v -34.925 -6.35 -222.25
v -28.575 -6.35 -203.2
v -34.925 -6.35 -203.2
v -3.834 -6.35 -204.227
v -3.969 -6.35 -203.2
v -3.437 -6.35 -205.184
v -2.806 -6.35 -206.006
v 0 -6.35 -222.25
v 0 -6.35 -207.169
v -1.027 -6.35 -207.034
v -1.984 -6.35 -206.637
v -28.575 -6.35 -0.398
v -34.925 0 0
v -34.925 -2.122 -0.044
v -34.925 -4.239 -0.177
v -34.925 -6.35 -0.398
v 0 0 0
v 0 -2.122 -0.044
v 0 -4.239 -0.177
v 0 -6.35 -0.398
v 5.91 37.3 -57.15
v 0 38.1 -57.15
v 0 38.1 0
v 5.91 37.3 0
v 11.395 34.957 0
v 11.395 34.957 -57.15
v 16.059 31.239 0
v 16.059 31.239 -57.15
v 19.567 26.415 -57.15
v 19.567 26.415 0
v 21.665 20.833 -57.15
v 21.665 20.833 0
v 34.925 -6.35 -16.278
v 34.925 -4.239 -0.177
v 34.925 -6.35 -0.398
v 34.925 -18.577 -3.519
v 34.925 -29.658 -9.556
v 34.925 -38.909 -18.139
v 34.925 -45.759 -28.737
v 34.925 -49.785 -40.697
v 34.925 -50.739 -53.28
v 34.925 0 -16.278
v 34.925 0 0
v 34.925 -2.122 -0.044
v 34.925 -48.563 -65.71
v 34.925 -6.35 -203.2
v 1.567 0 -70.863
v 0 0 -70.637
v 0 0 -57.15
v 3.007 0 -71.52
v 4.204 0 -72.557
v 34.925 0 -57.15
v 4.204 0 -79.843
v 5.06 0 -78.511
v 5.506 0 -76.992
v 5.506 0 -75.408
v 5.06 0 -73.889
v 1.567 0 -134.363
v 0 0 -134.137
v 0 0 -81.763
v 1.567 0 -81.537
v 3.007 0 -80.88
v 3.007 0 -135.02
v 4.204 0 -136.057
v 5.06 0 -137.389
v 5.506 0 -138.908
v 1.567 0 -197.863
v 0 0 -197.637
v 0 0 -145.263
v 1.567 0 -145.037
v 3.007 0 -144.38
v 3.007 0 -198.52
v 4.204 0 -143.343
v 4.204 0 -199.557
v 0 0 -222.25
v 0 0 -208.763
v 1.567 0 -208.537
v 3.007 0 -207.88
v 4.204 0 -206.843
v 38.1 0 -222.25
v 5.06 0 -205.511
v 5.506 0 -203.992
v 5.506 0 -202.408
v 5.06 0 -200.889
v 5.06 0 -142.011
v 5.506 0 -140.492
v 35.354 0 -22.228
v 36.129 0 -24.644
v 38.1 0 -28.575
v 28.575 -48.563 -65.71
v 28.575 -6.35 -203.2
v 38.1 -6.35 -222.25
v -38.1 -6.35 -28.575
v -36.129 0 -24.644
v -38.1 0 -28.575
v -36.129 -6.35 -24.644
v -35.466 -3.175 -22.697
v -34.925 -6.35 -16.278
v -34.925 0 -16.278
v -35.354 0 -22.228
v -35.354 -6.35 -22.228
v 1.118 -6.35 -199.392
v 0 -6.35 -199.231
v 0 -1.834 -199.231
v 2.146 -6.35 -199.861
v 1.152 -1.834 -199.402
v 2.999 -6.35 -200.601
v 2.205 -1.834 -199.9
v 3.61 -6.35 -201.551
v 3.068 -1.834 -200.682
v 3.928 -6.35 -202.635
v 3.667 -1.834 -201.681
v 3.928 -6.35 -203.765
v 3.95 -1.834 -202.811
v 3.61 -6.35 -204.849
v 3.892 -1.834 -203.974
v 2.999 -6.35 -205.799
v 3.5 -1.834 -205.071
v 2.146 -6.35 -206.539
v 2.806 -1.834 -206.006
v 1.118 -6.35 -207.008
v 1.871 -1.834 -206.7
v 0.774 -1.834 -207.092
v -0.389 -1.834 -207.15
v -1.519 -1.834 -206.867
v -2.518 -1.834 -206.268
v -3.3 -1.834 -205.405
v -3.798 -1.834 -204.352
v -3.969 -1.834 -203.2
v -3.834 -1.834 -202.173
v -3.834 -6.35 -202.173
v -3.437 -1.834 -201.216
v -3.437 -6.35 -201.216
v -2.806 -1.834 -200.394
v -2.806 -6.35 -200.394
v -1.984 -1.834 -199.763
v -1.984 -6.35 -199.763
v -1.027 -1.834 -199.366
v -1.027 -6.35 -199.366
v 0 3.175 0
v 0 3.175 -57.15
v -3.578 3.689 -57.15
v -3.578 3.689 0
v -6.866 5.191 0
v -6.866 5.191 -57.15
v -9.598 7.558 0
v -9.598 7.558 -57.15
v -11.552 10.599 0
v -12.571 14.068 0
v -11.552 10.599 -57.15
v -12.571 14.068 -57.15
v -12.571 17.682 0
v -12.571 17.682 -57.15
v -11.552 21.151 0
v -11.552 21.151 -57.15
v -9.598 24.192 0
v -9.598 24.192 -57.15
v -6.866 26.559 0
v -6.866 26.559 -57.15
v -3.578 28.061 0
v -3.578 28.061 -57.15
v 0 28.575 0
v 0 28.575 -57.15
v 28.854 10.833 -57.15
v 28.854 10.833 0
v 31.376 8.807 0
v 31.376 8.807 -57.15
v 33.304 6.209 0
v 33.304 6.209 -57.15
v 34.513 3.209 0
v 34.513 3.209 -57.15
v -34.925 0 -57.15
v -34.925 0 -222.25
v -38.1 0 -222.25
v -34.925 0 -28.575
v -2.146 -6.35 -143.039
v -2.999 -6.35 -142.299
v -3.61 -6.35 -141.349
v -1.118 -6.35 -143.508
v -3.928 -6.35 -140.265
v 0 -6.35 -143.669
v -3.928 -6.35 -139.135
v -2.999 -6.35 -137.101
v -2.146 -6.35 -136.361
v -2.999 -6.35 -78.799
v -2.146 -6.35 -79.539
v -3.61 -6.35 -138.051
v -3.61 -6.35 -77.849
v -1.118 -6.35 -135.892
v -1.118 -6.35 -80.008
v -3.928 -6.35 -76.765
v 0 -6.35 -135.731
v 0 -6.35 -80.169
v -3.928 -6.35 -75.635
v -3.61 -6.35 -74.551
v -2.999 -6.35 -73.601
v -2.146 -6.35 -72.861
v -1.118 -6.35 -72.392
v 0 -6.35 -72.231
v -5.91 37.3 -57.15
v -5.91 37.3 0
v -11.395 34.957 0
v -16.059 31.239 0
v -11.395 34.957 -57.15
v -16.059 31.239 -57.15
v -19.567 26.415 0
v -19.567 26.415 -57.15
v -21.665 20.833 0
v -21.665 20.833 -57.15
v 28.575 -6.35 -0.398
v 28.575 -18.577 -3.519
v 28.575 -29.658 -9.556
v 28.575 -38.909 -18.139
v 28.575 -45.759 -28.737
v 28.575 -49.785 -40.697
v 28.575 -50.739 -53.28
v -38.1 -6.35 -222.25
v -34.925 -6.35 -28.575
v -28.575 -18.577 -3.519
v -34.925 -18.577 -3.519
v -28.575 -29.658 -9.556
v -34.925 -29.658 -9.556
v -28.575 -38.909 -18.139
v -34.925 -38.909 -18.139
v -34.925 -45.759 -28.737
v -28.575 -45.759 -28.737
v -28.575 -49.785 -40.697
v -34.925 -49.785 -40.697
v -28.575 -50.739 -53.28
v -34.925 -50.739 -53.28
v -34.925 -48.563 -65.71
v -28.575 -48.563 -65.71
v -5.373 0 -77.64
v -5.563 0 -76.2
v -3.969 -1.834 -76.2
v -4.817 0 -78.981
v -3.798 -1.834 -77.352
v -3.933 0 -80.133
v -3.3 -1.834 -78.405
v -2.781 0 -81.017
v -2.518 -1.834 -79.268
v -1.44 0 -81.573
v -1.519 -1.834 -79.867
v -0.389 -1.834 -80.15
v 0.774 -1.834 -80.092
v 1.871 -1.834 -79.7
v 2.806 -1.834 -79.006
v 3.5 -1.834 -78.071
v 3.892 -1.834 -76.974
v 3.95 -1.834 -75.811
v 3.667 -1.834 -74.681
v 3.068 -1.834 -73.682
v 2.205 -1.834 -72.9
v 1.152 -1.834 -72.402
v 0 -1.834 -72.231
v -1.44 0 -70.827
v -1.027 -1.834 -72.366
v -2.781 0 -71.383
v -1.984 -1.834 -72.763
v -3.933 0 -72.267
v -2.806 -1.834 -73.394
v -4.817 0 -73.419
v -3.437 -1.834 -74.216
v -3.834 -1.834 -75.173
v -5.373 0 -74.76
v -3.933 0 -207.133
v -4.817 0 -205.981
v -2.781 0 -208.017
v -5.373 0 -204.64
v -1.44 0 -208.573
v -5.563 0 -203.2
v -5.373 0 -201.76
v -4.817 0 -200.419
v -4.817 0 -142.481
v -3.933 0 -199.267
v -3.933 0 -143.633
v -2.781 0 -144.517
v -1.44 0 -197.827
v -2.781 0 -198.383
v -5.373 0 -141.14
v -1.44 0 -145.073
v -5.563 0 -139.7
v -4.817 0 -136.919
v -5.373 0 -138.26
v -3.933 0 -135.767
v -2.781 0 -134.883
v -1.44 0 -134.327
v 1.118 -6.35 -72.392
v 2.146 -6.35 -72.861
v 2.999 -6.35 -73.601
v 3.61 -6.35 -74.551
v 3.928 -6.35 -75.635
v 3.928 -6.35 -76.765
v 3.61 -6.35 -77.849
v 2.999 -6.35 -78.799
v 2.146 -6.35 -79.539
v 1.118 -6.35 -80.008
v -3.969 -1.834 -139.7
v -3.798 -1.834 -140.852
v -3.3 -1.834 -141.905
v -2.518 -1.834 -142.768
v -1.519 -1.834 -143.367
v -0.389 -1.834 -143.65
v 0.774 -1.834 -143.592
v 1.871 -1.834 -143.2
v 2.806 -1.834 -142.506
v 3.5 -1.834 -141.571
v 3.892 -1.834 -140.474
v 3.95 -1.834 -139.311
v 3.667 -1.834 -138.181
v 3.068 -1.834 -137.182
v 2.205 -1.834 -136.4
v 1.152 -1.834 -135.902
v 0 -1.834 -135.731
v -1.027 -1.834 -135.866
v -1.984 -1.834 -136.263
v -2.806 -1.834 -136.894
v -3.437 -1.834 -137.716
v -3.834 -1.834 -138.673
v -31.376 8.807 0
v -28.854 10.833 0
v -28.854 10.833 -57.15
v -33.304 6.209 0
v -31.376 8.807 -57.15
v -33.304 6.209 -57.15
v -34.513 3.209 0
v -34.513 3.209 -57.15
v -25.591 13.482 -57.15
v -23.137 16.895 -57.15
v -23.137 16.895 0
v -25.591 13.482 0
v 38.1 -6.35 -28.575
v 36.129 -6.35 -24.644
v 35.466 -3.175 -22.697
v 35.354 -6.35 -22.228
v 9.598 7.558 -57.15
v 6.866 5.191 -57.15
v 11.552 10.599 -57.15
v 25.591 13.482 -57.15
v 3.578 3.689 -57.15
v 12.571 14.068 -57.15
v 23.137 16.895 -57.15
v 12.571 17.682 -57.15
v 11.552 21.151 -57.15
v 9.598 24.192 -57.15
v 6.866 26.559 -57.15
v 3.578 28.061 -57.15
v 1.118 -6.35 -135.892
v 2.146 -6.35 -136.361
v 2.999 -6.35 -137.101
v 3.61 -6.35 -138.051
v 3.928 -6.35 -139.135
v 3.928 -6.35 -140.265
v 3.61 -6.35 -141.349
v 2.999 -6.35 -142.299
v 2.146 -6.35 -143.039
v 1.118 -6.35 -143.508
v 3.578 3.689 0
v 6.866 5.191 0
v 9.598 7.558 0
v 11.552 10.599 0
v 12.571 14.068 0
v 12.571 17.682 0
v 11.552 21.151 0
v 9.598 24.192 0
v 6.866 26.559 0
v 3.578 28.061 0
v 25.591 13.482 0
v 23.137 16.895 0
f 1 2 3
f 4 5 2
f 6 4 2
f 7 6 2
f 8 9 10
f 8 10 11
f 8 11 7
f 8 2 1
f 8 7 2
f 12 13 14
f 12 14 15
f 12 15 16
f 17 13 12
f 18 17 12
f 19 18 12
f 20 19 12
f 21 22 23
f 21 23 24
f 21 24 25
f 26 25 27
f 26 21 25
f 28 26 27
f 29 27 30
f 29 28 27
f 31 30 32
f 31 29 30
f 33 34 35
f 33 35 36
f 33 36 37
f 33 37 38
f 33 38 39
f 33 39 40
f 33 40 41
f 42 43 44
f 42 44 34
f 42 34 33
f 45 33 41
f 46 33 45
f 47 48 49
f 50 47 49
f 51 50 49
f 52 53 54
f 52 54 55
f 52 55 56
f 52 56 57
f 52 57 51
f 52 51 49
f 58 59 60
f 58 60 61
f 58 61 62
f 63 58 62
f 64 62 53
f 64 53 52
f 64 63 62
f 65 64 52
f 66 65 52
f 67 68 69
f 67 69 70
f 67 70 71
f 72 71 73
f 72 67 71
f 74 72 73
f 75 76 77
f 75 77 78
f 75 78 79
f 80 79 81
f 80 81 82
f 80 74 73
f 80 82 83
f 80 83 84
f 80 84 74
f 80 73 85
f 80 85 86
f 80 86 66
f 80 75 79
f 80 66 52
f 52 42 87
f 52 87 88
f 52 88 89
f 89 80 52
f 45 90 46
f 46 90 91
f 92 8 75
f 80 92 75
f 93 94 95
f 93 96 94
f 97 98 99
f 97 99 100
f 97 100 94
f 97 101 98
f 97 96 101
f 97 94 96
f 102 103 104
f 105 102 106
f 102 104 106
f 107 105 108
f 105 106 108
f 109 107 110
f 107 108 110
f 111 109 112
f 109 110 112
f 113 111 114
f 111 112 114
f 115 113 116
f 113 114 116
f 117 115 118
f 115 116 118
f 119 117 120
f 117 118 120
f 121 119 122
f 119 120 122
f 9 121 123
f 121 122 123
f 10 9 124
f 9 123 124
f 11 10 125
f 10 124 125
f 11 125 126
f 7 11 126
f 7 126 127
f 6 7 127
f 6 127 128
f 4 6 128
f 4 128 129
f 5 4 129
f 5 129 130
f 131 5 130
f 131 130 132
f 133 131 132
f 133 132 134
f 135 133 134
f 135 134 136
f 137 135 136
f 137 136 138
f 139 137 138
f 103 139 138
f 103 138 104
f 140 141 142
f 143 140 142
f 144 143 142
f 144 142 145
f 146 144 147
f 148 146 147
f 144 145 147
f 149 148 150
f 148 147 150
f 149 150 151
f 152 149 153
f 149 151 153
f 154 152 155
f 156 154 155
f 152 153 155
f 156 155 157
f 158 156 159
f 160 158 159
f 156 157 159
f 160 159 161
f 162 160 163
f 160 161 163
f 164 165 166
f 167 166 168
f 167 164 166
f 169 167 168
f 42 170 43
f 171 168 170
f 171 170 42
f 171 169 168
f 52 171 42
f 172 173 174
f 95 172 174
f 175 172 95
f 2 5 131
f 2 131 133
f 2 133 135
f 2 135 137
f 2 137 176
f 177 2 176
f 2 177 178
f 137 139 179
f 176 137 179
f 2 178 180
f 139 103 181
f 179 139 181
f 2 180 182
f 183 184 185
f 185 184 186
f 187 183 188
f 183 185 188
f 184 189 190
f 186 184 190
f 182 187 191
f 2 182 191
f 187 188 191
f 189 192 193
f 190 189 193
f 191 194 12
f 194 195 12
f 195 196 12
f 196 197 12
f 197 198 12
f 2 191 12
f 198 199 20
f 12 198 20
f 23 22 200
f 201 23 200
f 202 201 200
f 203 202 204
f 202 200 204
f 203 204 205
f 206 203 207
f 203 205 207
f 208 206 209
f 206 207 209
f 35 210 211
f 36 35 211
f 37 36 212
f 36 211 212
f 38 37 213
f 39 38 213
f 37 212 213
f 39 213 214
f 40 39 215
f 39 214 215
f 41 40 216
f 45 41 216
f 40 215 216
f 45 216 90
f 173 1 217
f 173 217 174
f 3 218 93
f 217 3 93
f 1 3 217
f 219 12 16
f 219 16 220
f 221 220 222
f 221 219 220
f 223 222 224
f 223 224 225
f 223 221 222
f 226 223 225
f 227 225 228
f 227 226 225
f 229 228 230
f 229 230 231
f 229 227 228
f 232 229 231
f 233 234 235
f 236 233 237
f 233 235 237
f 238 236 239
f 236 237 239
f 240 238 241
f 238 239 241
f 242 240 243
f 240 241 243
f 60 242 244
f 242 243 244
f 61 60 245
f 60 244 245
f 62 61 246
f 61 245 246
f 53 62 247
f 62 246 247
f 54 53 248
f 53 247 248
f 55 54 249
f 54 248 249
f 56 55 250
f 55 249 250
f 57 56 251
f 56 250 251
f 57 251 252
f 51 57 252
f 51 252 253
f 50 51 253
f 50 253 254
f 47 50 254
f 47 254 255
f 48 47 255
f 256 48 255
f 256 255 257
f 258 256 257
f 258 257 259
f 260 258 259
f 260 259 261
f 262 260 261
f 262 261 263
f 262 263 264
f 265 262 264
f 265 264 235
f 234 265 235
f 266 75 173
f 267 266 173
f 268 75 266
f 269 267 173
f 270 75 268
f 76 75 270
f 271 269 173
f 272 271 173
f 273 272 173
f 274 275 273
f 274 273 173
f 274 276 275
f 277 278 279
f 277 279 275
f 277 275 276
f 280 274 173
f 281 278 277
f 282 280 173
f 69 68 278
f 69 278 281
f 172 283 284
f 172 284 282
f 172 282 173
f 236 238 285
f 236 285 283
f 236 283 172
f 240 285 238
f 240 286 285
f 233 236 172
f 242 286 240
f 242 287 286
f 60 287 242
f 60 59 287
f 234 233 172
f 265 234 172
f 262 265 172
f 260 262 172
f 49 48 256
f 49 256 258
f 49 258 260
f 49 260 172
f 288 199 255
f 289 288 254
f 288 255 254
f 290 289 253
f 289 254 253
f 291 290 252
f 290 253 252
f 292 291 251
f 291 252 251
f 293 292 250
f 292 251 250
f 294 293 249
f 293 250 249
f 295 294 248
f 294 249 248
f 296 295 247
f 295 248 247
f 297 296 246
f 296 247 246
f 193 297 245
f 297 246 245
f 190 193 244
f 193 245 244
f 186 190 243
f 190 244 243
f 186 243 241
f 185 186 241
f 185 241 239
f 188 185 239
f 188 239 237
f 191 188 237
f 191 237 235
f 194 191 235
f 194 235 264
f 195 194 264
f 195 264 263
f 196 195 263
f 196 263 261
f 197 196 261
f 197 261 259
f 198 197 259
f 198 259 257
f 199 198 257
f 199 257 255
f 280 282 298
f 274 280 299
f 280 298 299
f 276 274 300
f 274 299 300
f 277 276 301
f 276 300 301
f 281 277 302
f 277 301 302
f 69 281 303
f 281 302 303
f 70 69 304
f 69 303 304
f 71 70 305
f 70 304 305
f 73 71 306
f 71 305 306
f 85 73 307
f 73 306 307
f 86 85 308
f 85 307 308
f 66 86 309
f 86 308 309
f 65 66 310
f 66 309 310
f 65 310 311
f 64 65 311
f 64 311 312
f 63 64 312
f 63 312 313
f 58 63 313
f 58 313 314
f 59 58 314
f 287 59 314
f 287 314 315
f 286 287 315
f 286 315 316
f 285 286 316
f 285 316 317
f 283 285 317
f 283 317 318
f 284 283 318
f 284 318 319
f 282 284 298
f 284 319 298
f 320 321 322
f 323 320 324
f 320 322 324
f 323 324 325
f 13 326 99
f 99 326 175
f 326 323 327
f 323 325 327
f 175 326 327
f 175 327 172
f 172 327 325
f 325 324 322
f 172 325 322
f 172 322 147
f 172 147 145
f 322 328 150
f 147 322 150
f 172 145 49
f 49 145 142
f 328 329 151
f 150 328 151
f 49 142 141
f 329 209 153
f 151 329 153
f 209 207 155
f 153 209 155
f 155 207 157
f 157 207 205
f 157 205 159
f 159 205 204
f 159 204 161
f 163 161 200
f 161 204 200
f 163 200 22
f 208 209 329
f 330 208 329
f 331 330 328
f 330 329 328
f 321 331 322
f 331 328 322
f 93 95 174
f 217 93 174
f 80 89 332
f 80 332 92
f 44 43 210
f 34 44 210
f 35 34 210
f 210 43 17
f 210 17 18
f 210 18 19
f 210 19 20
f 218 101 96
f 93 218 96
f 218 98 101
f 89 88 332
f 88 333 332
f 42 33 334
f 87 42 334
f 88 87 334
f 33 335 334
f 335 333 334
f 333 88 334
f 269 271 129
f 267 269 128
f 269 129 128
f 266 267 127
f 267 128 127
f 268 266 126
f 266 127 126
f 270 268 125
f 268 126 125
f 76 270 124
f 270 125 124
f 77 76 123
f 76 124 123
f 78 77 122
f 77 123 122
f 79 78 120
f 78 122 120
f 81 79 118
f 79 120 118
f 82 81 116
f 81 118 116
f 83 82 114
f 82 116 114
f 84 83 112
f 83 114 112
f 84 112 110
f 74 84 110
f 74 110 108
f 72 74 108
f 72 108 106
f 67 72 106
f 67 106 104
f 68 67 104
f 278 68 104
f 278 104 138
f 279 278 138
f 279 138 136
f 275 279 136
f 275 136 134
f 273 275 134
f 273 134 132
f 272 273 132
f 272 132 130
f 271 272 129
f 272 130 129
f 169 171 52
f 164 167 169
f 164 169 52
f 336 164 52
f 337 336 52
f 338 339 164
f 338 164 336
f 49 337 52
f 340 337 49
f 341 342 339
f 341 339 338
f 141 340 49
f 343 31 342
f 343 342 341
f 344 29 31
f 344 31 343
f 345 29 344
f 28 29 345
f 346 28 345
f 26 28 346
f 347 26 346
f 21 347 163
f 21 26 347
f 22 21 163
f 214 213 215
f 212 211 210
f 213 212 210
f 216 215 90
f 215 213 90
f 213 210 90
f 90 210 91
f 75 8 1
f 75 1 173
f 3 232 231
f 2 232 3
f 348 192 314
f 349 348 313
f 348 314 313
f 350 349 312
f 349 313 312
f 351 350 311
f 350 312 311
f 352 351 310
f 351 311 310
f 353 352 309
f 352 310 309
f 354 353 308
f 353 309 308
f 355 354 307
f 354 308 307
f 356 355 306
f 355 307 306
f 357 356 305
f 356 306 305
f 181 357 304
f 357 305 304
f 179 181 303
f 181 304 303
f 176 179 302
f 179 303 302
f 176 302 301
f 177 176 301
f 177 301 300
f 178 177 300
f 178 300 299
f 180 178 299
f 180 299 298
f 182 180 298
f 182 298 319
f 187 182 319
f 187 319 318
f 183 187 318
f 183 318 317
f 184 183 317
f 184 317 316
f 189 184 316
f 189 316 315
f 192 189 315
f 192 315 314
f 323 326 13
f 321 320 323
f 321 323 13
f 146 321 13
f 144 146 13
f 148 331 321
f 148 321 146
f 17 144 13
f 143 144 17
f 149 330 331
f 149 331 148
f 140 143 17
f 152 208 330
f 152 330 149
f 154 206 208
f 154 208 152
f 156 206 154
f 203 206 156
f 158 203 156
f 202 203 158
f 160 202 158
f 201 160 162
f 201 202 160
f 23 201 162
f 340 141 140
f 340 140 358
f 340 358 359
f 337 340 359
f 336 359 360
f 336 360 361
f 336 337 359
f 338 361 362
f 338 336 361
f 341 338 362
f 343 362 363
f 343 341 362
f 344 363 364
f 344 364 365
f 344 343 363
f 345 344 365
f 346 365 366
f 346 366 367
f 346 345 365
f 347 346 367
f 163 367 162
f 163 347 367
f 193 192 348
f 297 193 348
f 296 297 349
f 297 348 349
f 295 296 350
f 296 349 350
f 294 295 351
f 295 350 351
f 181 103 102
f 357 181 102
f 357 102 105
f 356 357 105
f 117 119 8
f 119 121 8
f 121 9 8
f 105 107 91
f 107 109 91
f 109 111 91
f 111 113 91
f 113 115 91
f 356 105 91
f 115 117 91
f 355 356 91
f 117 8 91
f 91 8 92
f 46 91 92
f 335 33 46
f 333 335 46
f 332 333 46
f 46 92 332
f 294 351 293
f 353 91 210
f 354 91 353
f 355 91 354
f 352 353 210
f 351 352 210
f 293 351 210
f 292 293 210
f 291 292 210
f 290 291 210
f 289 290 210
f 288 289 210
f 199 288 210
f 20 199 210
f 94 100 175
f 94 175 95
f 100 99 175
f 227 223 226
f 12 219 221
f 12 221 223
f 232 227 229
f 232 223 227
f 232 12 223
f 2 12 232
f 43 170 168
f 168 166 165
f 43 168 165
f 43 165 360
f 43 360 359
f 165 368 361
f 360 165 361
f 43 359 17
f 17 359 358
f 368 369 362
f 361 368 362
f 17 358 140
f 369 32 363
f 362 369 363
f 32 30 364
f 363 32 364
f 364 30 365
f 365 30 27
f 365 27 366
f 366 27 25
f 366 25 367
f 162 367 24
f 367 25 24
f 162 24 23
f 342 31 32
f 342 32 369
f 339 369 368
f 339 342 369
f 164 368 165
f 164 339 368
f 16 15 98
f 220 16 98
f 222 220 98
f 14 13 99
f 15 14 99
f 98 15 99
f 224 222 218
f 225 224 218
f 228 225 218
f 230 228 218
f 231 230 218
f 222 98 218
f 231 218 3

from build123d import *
from build123d.topology import SkipClean

# Parameters (mm, degrees)
BOSS_EXTRUDE1_DEPTH                             = 34.925
BOSS_EXTRUDE2_DEPTH                             = 38.1
CUT_EXTRUDE1_DEPTH                              = 28.575
FILLET1_START                                   = -6.35
FILLET1_DEPTH                                   = 6.35
BOSS_EXTRUDE3_START                             = -165.1
BOSS_EXTRUDE3_DEPTH                             = 57.15
SKETCH4_R                                       = 3.96875
CUT_EXTRUDE3_DEPTH                              = 232.143489097
CSK_FOR_12_FLAT_HEAD_MACHINE_SCREW1_D           = 5.7912
CSK_FOR_12_FLAT_HEAD_MACHINE_SCREW1_CSINK_D     = 11.1252
CSK_FOR_12_FLAT_HEAD_MACHINE_SCREW1_CSINK_ANGLE = 82


with BuildPart() as part:
    # Sketch2 → Boss-Extrude1 (new body)
    with BuildSketch(Plane(origin=(0, 0, 0), x_dir=(0, 0, -1), z_dir=(1, 0, 0))):
        with BuildLine():
            Line((28.575, -6.35), (0.398437524, -6.35))
            ThreePointArc((0.398437524, -6.35), (23.224782374, -42.664357172), (65.709887751, -48.562693987))
            Line((65.709887751, -48.562693987), (203.2, -6.35))
            Line((203.2, -6.35), (28.575, -6.35))
        make_face()
        Polygon((222.25, 0), (28.575, 0), (28.575, -6.35), (203.2, -6.35), (222.25, -6.35), align=None)
        with BuildLine():
            Line((28.575, 0), (0, 0))
            ThreePointArc((0, 0), (0.099707231, -3.181243957), (0.398437524, -6.35))
            Line((0.398437524, -6.35), (28.575, -6.35))
            Line((28.575, -6.35), (28.575, 0))
        make_face()
    boss_extrude1 = extrude(amount=BOSS_EXTRUDE1_DEPTH)

    # Sketch2<3> → Boss-Extrude2 (add)
    with BuildSketch(Plane(origin=(0, 0, 0), x_dir=(0, 0, -1), z_dir=(1, 0, 0))):
        Polygon((222.25, 0), (28.575, 0), (28.575, -6.35), (203.2, -6.35), (222.25, -6.35), align=None)
    boss_extrude2 = extrude(amount=BOSS_EXTRUDE2_DEPTH)

    # Sketch2<4> → Cut-Extrude1 (cut)
    with BuildSketch(Plane(origin=(0, 0, 0), x_dir=(0, 0, -1), z_dir=(1, 0, 0))):
        with BuildLine():
            Line((28.575, -6.35), (0.398437524, -6.35))
            ThreePointArc((0.398437524, -6.35), (23.224782374, -42.664357172), (65.709887751, -48.562693987))
            Line((65.709887751, -48.562693987), (203.2, -6.35))
            Line((203.2, -6.35), (28.575, -6.35))
        make_face()
    cut_extrude1 = extrude(amount=CUT_EXTRUDE1_DEPTH, mode=Mode.SUBTRACT)

    # Fillet1: read off the stored shape, not the designer's step
    # Fillet1 outline → Fillet1 (add)
    with BuildSketch(Plane(origin=(0, 0, 0), x_dir=(1, 0, 0), z_dir=(0, 1, 0)).offset(FILLET1_START)):
        with BuildLine():
            Line((34.925, 28.575), (34.925, 16.278277876))
            add(Edge.make_bspline(
                [(34.925, 16.278277876), (34.925, 22.836529675), (38.1, 28.575)],
                knots=[0, 0, 0, 1, 1, 1], degree=2, weights=[1, 1.936491673, 1]))
            Line((38.1, 28.575), (34.925, 28.575))
        make_face()
    fillet1 = extrude(amount=FILLET1_DEPTH)

    # Sketch3 → Boss-Extrude3 (add)
    with BuildSketch(Plane(origin=(0, 0, -222.25), x_dir=(-1, 0, 0), z_dir=(0, 0, -1)).offset(BOSS_EXTRUDE3_START)):
        with BuildLine():
            Line((0, 0), (0, 3.175))
            ThreePointArc((0, 3.175), (-12.7, 15.875), (0, 28.575))
            Line((0, 28.575), (0, 38.1))
            ThreePointArc((0, 38.1), (-13.852256532, 33.255034924), (-21.665035078, 20.832507443))
            ThreePointArc((-21.665035078, 20.832507443), (-24.250245873, 15.107068484), (-28.853915615, 10.832704084))
            ThreePointArc((-28.853915615, 10.832704084), (-33.303746055, 6.208976231), (-34.925, 0))
            Line((-34.925, 0), (0, 0))
        make_face()
    boss_extrude3 = extrude(amount=-BOSS_EXTRUDE3_DEPTH)

    # Mirror1: Boss-Extrude1, Boss-Extrude2, Cut-Extrude1, Fillet1, Boss-Extrude3 across plane
    with SkipClean():  # the faces are left unmerged after this step: merging them gives an invalid solid
        add(boss_extrude1.mirror(Plane(origin=(0, 28.575, 0), x_dir=(0, 0, 1), z_dir=(-1, 0, 0))))
        add(boss_extrude2.mirror(Plane(origin=(0, 28.575, 0), x_dir=(0, 0, 1), z_dir=(-1, 0, 0))))
        add(cut_extrude1.mirror(Plane(origin=(0, 28.575, 0), x_dir=(0, 0, 1), z_dir=(-1, 0, 0))), mode=Mode.SUBTRACT)
        add(fillet1.mirror(Plane(origin=(0, 28.575, 0), x_dir=(0, 0, 1), z_dir=(-1, 0, 0))))
        add(boss_extrude3.mirror(Plane(origin=(0, 28.575, 0), x_dir=(0, 0, 1), z_dir=(-1, 0, 0))))

    # Sketch4 → Cut-Extrude3 (cut, through all)
    with SkipClean():  # the faces are left unmerged after this step: merging them gives an invalid solid
        with BuildSketch(Plane(origin=(0, 0, 0), x_dir=(1, 0, 0), z_dir=(0, 1, 0))):
            with Locations(Location((0, 203.2, 0), (0, 0, 270))):
                Circle(SKETCH4_R)
            with Locations(Location((0, 139.7, 0), (0, 0, 270))):
                Circle(SKETCH4_R)
            with Locations(Location((0, 76.2, 0), (0, 0, 270))):
                Circle(SKETCH4_R)
        extrude(amount=-CUT_EXTRUDE3_DEPTH, mode=Mode.SUBTRACT)

    # CSK for #12 Flat Head Machine Screw1 (through all)
    with Locations(Plane(origin=(0, 0, 0), x_dir=(1, 0, 0), z_dir=(0, 1, 0))):
        with Locations((0, 76.2), (0, 139.7), (0, 203.2)):
            CounterSinkHole(CSK_FOR_12_FLAT_HEAD_MACHINE_SCREW1_D / 2, CSK_FOR_12_FLAT_HEAD_MACHINE_SCREW1_CSINK_D / 2, counter_sink_angle=CSK_FOR_12_FLAT_HEAD_MACHINE_SCREW1_CSINK_ANGLE)


solid = part.part
